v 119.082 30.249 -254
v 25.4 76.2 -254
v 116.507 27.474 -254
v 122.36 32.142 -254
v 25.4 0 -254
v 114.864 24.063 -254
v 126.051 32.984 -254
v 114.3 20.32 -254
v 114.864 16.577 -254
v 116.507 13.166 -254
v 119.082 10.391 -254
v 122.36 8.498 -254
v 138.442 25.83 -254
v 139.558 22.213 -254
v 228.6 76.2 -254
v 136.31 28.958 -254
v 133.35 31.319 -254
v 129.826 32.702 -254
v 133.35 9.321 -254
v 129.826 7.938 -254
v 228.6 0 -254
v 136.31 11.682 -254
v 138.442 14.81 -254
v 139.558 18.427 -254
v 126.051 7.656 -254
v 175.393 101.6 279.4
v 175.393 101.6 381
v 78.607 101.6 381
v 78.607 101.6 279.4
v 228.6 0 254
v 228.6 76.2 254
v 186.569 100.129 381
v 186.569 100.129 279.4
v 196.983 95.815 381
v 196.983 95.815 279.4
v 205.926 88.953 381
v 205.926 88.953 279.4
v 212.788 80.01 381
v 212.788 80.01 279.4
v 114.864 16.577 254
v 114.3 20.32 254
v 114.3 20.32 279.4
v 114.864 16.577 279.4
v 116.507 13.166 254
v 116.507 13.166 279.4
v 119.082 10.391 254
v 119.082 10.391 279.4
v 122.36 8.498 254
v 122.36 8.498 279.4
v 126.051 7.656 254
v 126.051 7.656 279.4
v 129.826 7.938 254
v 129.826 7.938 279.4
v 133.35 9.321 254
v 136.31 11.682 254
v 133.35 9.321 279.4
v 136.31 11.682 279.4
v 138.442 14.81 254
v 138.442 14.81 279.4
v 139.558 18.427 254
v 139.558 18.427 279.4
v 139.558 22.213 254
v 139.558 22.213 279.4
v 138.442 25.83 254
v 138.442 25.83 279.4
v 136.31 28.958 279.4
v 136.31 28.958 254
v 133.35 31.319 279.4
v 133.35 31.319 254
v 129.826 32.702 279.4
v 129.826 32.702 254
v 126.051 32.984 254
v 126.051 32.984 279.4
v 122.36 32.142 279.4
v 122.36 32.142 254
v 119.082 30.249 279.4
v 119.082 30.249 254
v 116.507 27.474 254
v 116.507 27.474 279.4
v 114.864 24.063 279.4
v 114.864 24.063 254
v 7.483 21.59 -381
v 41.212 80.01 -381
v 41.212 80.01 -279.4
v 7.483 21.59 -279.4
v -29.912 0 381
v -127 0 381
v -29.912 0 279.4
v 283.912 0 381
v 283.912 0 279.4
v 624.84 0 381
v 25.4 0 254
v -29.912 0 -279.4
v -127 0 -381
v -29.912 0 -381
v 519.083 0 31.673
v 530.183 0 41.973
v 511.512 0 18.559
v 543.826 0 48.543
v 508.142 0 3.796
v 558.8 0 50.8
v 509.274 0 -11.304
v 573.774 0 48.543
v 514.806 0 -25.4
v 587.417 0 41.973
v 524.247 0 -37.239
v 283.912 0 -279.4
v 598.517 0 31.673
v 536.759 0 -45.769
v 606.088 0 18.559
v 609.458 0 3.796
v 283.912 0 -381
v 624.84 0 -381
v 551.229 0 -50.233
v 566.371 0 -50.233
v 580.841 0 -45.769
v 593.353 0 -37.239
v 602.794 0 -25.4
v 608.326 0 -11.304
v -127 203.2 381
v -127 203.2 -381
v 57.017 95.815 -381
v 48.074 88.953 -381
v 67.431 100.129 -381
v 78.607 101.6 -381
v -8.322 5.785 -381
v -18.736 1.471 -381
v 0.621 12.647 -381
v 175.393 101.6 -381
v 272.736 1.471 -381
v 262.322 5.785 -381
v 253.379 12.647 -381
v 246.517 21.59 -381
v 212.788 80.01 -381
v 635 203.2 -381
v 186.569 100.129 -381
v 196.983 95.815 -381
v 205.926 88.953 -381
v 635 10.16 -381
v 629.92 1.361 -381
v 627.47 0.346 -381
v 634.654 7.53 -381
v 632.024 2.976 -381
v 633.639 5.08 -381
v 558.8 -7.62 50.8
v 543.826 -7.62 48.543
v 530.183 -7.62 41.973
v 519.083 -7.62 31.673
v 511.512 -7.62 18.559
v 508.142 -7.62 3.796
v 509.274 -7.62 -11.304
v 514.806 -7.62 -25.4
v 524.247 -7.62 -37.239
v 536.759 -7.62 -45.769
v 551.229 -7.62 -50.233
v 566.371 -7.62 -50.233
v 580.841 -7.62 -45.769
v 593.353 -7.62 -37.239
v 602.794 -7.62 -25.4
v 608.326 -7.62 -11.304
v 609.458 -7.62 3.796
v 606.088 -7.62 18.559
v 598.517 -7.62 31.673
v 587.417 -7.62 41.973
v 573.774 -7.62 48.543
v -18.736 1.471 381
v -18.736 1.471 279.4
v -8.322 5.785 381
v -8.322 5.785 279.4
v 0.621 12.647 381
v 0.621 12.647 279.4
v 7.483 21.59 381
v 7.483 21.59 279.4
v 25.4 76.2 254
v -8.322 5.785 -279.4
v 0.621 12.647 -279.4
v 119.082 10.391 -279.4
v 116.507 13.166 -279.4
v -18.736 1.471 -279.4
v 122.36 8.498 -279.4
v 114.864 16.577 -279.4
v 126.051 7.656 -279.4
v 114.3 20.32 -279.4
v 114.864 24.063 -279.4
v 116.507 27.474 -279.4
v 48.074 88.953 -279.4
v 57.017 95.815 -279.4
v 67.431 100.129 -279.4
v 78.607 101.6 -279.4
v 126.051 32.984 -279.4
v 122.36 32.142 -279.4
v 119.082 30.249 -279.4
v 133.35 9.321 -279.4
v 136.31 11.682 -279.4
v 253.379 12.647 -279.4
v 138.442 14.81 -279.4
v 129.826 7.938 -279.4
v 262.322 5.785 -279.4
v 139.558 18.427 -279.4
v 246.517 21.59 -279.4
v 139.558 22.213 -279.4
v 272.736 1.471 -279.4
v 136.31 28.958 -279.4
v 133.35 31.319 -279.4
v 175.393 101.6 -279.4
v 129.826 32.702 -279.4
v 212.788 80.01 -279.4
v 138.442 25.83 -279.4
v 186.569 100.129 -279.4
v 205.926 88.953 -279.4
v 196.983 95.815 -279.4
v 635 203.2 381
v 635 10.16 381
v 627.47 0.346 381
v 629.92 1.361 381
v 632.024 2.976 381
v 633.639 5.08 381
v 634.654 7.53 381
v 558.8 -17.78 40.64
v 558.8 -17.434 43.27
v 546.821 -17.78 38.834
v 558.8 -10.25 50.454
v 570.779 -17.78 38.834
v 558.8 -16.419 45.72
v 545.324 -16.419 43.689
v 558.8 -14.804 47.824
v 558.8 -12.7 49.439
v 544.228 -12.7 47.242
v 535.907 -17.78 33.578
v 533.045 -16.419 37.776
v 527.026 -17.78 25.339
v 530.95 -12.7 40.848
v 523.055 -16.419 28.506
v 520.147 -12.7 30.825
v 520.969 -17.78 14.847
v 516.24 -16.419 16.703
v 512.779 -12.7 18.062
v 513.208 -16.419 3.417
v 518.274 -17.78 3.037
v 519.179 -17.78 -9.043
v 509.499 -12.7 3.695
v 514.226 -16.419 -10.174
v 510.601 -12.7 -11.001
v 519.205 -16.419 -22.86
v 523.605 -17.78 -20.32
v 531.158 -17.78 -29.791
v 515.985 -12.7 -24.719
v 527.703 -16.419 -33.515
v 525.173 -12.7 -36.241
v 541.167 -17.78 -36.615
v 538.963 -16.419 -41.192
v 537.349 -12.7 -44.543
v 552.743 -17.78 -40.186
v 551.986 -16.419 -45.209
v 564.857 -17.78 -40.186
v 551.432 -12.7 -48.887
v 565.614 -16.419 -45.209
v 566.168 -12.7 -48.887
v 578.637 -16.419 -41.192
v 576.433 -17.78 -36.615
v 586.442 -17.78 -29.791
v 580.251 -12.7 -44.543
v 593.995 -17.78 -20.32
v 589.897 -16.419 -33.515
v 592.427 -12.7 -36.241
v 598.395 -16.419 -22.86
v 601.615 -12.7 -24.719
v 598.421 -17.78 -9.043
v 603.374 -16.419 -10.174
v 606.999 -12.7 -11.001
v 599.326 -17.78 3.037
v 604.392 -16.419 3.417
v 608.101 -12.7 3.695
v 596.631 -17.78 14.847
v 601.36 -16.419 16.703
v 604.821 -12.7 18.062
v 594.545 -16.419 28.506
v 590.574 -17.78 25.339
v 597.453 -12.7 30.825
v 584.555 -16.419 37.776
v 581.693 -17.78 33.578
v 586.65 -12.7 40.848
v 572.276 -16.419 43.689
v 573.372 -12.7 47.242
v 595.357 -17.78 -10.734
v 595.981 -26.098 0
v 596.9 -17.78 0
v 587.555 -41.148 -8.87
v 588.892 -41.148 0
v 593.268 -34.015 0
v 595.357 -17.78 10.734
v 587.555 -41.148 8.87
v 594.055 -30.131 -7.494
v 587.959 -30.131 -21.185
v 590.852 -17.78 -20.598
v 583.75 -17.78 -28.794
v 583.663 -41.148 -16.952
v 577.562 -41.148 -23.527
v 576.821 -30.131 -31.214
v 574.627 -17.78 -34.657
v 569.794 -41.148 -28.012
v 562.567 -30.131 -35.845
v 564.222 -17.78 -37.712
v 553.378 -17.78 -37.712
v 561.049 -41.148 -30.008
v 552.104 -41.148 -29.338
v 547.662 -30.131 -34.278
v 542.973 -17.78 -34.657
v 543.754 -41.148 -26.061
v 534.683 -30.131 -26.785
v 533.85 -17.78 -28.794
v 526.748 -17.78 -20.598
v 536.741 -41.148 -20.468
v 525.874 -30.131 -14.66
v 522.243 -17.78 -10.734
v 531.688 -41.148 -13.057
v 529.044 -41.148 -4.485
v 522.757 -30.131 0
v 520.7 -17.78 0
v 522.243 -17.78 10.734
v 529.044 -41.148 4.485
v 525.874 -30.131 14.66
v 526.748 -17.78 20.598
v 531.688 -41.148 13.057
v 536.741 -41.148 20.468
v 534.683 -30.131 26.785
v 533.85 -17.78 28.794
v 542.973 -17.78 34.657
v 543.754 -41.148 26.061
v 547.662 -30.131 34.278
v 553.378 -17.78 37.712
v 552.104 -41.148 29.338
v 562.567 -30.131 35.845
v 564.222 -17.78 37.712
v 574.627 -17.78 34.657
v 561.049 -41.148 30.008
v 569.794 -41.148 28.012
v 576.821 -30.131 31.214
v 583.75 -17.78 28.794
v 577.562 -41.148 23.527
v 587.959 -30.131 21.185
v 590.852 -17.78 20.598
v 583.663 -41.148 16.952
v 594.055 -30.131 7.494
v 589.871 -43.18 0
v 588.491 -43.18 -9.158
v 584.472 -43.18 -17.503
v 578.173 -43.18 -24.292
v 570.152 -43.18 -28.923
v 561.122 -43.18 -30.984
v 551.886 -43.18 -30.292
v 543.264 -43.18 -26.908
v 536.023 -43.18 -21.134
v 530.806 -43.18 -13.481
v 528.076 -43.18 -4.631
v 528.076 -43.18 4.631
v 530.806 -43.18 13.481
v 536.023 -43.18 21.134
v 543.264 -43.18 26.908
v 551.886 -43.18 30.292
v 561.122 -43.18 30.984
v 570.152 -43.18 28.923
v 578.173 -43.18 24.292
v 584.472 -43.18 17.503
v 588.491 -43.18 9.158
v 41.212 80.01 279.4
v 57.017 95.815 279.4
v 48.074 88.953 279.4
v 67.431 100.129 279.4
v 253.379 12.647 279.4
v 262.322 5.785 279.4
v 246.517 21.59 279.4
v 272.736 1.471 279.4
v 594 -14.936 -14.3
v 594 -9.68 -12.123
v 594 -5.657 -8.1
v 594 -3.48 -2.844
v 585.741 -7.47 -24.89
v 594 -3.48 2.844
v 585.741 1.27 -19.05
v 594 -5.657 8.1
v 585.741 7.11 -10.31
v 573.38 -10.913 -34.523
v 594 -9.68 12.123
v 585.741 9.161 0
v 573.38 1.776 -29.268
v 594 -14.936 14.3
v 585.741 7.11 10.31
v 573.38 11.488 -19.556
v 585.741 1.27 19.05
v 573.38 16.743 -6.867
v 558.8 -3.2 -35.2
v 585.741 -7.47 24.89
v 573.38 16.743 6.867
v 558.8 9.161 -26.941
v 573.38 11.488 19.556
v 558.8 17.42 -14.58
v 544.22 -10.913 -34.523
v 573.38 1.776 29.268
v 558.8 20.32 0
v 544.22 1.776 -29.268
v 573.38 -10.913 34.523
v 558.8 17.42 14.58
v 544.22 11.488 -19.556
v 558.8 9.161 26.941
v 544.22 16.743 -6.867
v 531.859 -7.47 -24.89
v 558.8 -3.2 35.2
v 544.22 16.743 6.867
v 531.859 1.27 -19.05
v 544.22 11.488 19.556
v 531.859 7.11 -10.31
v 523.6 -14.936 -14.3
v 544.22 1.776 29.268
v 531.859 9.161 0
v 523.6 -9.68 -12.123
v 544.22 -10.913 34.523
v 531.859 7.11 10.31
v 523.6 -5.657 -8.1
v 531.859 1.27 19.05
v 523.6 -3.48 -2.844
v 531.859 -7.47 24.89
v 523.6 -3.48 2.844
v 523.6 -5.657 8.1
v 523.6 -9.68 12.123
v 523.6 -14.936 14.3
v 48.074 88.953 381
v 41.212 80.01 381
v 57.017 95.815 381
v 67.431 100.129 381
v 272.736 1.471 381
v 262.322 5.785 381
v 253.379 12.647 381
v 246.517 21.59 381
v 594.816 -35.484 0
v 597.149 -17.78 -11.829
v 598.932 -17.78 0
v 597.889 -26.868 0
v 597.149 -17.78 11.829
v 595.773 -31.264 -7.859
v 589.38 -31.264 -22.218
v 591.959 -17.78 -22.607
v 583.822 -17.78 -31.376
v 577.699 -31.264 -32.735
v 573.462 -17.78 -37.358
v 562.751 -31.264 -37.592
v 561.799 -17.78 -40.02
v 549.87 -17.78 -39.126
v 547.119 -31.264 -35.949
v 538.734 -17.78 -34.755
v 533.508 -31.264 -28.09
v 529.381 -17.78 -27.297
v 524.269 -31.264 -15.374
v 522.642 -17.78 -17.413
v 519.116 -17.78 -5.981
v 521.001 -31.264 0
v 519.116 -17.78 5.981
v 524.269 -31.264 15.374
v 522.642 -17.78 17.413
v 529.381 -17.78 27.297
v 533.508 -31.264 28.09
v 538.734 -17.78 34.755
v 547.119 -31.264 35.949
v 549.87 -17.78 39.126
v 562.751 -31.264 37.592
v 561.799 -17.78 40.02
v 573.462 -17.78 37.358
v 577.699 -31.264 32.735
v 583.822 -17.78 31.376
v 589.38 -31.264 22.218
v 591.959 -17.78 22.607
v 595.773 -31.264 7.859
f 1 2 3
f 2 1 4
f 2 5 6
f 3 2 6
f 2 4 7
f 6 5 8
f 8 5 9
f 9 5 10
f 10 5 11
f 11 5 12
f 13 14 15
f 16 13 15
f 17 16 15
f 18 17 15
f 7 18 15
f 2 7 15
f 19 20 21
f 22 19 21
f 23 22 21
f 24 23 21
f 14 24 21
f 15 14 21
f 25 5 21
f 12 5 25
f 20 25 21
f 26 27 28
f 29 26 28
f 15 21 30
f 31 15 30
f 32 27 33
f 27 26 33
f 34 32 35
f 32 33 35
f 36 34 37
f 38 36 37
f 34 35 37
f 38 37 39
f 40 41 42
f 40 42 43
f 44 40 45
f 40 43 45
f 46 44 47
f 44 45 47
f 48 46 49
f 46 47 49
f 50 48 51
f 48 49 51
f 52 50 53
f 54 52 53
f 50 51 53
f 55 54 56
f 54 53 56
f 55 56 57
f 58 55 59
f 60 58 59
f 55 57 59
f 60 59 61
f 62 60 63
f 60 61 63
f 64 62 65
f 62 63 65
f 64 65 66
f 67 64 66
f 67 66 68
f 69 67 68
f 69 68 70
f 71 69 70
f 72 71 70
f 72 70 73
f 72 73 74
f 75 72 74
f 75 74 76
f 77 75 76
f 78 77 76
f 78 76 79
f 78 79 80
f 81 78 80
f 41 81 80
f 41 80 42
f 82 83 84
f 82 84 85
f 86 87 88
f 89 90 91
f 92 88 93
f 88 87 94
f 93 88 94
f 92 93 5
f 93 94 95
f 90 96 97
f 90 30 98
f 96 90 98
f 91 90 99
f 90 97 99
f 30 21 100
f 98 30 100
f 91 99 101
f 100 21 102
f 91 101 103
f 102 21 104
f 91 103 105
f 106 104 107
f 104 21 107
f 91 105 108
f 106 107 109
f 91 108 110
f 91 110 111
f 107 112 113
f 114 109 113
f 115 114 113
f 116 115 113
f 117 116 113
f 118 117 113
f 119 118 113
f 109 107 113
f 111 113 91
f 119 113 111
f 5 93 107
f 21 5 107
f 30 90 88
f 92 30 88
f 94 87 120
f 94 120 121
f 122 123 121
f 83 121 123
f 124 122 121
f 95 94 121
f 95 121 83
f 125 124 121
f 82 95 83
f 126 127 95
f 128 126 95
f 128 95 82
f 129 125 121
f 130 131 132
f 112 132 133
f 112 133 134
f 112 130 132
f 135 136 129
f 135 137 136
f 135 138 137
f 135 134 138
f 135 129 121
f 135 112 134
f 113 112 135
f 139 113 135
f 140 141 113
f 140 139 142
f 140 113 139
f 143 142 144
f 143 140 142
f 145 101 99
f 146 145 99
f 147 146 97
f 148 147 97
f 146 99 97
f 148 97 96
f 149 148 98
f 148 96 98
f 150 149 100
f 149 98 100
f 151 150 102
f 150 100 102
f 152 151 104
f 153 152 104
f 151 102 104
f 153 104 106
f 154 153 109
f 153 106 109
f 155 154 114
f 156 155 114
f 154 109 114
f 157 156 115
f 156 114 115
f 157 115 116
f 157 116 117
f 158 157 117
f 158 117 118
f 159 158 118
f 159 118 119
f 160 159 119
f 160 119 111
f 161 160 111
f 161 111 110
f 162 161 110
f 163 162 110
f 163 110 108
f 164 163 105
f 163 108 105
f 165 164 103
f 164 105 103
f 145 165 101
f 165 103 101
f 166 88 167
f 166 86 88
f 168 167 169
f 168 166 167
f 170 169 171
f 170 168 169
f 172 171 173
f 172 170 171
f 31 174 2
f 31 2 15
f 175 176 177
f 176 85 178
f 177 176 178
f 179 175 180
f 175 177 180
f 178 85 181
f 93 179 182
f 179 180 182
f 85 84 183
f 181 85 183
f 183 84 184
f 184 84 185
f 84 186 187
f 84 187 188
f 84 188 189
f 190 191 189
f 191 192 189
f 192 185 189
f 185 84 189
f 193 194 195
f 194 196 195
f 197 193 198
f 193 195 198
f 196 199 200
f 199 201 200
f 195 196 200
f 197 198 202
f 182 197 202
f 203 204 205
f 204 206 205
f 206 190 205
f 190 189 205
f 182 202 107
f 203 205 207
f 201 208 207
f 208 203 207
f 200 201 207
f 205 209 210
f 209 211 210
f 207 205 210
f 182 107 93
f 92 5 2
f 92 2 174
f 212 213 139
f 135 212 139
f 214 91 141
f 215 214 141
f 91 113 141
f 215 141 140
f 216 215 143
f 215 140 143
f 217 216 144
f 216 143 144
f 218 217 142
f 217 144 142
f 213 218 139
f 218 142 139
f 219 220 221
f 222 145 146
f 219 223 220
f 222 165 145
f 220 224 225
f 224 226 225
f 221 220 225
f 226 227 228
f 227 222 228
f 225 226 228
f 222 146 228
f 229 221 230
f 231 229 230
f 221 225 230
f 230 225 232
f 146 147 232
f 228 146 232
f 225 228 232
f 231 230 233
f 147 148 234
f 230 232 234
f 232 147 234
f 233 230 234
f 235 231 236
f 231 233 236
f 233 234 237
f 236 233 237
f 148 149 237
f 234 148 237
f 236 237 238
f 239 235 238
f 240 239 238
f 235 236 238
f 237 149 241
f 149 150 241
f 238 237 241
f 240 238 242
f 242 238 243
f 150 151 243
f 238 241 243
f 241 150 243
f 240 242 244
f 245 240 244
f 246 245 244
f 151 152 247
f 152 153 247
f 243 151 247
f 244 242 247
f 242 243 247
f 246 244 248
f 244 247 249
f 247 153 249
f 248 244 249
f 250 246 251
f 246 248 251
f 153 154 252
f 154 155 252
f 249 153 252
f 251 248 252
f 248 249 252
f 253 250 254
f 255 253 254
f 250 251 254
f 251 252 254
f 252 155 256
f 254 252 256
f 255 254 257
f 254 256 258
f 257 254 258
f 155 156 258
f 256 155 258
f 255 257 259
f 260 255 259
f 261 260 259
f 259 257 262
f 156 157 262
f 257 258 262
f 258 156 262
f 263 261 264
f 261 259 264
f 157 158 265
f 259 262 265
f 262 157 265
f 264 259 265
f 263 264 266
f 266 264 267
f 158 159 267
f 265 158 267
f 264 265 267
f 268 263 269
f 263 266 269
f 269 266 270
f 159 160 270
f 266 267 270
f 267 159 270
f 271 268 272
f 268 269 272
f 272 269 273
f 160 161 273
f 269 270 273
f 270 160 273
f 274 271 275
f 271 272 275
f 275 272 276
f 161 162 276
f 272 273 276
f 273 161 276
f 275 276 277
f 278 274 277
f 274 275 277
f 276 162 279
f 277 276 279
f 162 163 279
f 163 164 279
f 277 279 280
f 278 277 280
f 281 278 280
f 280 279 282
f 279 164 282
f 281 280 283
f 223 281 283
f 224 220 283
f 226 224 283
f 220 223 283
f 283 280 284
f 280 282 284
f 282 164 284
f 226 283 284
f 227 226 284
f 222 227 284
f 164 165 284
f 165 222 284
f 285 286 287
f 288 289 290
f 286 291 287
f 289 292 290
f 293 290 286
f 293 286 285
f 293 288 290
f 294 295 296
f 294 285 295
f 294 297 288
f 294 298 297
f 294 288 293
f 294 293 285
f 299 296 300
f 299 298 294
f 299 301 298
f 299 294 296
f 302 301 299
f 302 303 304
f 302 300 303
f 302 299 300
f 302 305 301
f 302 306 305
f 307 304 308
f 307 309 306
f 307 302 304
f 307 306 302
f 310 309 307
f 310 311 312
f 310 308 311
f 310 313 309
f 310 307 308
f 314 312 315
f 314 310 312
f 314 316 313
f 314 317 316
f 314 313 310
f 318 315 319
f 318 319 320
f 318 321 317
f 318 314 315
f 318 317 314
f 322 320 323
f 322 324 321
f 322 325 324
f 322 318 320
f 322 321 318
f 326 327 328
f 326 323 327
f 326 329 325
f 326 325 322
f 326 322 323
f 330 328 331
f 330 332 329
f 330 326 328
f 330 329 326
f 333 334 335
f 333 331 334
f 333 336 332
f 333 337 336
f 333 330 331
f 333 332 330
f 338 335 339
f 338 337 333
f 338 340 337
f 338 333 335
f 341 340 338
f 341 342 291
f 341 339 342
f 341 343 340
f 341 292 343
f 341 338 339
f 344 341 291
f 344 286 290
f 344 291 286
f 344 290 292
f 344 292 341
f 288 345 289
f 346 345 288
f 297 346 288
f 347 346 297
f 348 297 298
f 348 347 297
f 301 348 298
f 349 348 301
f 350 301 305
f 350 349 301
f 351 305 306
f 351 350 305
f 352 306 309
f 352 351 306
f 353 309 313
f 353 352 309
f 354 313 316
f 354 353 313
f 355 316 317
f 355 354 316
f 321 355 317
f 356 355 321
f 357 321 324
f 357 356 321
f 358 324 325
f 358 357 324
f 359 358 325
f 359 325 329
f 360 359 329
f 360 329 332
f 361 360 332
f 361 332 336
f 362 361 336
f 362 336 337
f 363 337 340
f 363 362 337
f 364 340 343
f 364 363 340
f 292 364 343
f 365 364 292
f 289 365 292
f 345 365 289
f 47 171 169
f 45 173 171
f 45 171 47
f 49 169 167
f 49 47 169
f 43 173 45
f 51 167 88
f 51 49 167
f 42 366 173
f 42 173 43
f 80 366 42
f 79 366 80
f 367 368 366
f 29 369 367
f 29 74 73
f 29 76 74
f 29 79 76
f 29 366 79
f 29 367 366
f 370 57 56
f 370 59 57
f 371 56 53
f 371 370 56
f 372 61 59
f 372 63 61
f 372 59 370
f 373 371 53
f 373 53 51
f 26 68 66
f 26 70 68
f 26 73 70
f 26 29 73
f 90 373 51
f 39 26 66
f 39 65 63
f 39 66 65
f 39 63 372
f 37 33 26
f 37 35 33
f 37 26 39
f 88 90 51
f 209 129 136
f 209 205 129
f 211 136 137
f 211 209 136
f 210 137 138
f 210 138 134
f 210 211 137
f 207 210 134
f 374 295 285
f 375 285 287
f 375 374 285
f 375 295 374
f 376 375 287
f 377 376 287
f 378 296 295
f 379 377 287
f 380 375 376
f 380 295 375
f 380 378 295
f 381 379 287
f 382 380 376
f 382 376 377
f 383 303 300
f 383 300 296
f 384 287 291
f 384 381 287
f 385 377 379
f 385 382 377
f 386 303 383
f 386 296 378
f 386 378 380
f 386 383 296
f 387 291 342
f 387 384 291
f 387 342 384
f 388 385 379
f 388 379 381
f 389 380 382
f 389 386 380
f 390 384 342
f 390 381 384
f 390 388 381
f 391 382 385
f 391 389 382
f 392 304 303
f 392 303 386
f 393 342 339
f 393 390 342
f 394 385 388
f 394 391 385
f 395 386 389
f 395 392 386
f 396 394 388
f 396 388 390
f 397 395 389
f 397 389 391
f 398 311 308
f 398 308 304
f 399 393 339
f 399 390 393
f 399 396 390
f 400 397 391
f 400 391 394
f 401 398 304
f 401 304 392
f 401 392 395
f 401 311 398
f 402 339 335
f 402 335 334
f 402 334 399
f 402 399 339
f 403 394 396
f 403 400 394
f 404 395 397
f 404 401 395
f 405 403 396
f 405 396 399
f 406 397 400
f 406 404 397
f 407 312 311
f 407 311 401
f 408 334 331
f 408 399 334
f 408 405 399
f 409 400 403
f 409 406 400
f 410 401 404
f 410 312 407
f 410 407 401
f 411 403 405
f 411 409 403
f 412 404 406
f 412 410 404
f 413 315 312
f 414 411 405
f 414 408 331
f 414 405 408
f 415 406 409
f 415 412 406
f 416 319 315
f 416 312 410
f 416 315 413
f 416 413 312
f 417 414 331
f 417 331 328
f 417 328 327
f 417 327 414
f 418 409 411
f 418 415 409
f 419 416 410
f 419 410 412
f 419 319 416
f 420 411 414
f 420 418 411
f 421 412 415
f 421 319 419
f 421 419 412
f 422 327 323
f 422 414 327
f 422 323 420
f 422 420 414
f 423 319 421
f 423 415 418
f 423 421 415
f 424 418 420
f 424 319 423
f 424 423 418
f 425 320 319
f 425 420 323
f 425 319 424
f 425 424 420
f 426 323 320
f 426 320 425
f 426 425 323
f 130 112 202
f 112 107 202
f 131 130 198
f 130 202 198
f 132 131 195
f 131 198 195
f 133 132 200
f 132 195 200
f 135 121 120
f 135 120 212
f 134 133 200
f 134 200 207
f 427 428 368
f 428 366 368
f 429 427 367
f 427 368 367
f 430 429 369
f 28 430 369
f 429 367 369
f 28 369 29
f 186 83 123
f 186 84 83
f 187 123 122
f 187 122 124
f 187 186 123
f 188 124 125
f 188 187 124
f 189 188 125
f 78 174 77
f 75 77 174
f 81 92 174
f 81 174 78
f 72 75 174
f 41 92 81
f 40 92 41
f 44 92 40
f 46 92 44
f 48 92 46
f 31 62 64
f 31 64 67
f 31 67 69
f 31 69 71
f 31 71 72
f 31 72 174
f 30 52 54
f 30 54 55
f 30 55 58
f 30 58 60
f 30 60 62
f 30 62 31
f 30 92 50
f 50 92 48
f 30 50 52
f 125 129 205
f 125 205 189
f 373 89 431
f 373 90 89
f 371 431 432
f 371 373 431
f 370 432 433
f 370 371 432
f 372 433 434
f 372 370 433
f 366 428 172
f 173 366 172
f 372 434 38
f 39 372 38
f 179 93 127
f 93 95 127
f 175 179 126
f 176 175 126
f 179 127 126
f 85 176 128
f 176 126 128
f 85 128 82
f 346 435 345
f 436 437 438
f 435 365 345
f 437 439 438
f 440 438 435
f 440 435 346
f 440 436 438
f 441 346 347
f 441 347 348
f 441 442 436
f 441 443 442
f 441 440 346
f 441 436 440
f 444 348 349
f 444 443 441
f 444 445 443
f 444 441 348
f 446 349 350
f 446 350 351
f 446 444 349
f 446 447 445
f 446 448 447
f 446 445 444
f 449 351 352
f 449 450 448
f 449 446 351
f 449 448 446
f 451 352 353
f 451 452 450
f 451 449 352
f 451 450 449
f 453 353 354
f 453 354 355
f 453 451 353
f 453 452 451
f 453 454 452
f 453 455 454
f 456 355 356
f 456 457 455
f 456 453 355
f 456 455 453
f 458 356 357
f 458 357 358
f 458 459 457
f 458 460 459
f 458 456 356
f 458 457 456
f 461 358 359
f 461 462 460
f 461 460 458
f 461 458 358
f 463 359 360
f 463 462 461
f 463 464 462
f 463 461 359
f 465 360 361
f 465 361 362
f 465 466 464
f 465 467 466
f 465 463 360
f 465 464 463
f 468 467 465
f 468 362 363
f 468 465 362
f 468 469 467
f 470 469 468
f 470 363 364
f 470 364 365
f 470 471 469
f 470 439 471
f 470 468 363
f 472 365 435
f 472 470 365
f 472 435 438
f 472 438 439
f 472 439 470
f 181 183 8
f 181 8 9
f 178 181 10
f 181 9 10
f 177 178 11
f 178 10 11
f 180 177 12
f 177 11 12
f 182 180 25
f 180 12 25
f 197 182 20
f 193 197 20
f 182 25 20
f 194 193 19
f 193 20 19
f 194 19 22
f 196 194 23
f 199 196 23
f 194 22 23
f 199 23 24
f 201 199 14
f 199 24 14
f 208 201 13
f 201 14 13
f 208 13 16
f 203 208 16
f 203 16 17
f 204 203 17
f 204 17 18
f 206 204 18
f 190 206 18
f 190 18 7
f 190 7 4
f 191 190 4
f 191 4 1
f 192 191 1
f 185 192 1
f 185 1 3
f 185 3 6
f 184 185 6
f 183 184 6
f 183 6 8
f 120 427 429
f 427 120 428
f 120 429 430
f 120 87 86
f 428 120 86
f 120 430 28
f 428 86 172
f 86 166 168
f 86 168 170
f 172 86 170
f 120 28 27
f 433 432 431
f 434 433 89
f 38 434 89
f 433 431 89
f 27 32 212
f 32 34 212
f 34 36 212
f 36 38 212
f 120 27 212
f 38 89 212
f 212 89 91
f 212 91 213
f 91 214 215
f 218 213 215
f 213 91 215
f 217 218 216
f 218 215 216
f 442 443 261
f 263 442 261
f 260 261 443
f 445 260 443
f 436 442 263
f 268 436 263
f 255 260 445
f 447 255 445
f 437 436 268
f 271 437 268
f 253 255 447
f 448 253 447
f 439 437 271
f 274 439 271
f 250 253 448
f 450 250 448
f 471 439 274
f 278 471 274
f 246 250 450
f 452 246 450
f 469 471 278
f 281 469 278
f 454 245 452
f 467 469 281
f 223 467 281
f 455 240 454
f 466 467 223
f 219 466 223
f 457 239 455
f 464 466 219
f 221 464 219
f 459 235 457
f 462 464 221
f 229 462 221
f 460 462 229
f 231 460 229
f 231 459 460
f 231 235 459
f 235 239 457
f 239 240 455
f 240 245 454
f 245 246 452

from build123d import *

# Parameters (mm, degrees)
SKETCH1_W           = 762
SKETCH1_H           = 762
BOSS_EXTRUDE1_DEPTH = 203.2
CUT_EXTRUDE1_DEPTH  = 101.6
SKETCH4_W           = 203.2
SKETCH4_H           = 508
CUT_EXTRUDE2_DEPTH  = 76.2
SKETCH6_R           = 12.7
CUT_EXTRUDE3_DEPTH  = 939.426022657
FILLET2_R           = 43.18
SKETCH10_R          = 50.8
BOSS_EXTRUDE2_DEPTH = 17.78
FILLET3_R           = 10.16
FILLET4_R           = 10.16


# Read off the part's stored shape, not the designer's step: Revolve2
with BuildPart() as part:
    # Sketch1 → Boss-Extrude1 (new body)
    with BuildSketch(Plane(origin=(0, 0, 0), x_dir=(1, 0, 0), z_dir=(0, 1, 0))):
        with Locations((254, 0)):
            Rectangle(SKETCH1_W, SKETCH1_H)
    extrude(amount=BOSS_EXTRUDE1_DEPTH)

    # Sketch3 → Cut-Extrude1 (cut)
    with BuildSketch(Plane.XY.offset(381)):
        Polygon((200.323484187, 101.6), (53.676515813, 101.6), (-19.646968374, -25.4), (53.676515813, -152.4), (200.323484187, -152.4), (273.646968374, -25.4), align=None)
    cut_extrude1 = extrude(amount=-CUT_EXTRUDE1_DEPTH, mode=Mode.SUBTRACT)

    # Mirror1: Cut-Extrude1 across plane
    add(cut_extrude1.mirror(Plane.XY), mode=Mode.SUBTRACT)

    # Sketch4 → Cut-Extrude2 (cut)
    with BuildSketch(Plane.XZ):
        with Locations((127, 0)):
            Rectangle(SKETCH4_W, SKETCH4_H)
    extrude(amount=-CUT_EXTRUDE2_DEPTH, mode=Mode.SUBTRACT)

    # Sketch6 → Cut-Extrude3 (cut, through all)
    with BuildSketch(Plane.XY.offset(279.4)):
        with Locations(Location((127, 20.32, 0), (0, 0, 180))):
            Circle(SKETCH6_R)
    extrude(amount=-CUT_EXTRUDE3_DEPTH, mode=Mode.SUBTRACT)

    # Fillet2
    fillet2_edges = [part.edges().sort_by_distance(p)[0] for p in [
        (-4.982271537, 0, 330.2),
        (258.982271537, 0, 330.2),
        (200.323484187, 101.6, 330.2),
        (53.676515813, 101.6, 330.2),
        (-4.982271537, 0, -330.2),
        (258.982271537, 0, -330.2),
        (53.676515813, 101.6, -330.2),
        (200.323484187, 101.6, -330.2),
    ]]
    fillet(fillet2_edges, radius=FILLET2_R)

    # Sketch10 → Boss-Extrude2 (add)
    with BuildSketch(Plane.XZ):
        with Locations(Location((558.8, 0, 0), (0, 0, 90))):
            Circle(SKETCH10_R)
    extrude(amount=BOSS_EXTRUDE2_DEPTH)

    # Sketch12 → Cut-Revolve3 (revolve, cut)
    with BuildSketch(Plane(origin=(0, -17.78, 0), x_dir=(-1, 0, 0), z_dir=(0, -1, 0))):
        with BuildLine():
            Line((-520.7, 0), (-596.9, 0))
            ThreePointArc((-596.9, 0), (-558.8, -38.1), (-520.7, 0))
        make_face()
    revolve(axis=Axis((520.7, -17.78, 0), (1, 0, 0)), mode=Mode.SUBTRACT)

    # Revolve2 outline → Revolve2 (revolve)
    with BuildSketch(Plane(origin=(558.8, 0, 0), x_dir=(1, 0, 0), z_dir=(0, 0, 1))):
        with BuildLine():
            ThreePointArc((38.1, -17.77999996), (36.04252118, -30.130978383), (30.092300919, -41.14800003))
            Line((30.092300919, -41.14800003), (31.071167059, -43.180000031))
            ThreePointArc((31.071167059, -43.180000031), (37.79897817, -31.263867149), (40.132, -17.77999996))
            Line((40.132, -17.77999996), (38.1, -17.77999996))
        make_face()
    revolve(axis=Axis((558.8, 0, 0), (0, 1, 0)))

    # Fillet3
    fillet3_edges = [part.edges().sort_by_distance(p)[0] for p in [
        (558.8, -17.78, -50.8),
    ]]
    fillet(fillet3_edges, radius=FILLET3_R)

    # Fillet4
    fillet4_edges = [part.edges().sort_by_distance(p)[0] for p in [
        (635, 0, 0),
    ]]
    fillet(fillet4_edges, radius=FILLET4_R)


solid = part.part
